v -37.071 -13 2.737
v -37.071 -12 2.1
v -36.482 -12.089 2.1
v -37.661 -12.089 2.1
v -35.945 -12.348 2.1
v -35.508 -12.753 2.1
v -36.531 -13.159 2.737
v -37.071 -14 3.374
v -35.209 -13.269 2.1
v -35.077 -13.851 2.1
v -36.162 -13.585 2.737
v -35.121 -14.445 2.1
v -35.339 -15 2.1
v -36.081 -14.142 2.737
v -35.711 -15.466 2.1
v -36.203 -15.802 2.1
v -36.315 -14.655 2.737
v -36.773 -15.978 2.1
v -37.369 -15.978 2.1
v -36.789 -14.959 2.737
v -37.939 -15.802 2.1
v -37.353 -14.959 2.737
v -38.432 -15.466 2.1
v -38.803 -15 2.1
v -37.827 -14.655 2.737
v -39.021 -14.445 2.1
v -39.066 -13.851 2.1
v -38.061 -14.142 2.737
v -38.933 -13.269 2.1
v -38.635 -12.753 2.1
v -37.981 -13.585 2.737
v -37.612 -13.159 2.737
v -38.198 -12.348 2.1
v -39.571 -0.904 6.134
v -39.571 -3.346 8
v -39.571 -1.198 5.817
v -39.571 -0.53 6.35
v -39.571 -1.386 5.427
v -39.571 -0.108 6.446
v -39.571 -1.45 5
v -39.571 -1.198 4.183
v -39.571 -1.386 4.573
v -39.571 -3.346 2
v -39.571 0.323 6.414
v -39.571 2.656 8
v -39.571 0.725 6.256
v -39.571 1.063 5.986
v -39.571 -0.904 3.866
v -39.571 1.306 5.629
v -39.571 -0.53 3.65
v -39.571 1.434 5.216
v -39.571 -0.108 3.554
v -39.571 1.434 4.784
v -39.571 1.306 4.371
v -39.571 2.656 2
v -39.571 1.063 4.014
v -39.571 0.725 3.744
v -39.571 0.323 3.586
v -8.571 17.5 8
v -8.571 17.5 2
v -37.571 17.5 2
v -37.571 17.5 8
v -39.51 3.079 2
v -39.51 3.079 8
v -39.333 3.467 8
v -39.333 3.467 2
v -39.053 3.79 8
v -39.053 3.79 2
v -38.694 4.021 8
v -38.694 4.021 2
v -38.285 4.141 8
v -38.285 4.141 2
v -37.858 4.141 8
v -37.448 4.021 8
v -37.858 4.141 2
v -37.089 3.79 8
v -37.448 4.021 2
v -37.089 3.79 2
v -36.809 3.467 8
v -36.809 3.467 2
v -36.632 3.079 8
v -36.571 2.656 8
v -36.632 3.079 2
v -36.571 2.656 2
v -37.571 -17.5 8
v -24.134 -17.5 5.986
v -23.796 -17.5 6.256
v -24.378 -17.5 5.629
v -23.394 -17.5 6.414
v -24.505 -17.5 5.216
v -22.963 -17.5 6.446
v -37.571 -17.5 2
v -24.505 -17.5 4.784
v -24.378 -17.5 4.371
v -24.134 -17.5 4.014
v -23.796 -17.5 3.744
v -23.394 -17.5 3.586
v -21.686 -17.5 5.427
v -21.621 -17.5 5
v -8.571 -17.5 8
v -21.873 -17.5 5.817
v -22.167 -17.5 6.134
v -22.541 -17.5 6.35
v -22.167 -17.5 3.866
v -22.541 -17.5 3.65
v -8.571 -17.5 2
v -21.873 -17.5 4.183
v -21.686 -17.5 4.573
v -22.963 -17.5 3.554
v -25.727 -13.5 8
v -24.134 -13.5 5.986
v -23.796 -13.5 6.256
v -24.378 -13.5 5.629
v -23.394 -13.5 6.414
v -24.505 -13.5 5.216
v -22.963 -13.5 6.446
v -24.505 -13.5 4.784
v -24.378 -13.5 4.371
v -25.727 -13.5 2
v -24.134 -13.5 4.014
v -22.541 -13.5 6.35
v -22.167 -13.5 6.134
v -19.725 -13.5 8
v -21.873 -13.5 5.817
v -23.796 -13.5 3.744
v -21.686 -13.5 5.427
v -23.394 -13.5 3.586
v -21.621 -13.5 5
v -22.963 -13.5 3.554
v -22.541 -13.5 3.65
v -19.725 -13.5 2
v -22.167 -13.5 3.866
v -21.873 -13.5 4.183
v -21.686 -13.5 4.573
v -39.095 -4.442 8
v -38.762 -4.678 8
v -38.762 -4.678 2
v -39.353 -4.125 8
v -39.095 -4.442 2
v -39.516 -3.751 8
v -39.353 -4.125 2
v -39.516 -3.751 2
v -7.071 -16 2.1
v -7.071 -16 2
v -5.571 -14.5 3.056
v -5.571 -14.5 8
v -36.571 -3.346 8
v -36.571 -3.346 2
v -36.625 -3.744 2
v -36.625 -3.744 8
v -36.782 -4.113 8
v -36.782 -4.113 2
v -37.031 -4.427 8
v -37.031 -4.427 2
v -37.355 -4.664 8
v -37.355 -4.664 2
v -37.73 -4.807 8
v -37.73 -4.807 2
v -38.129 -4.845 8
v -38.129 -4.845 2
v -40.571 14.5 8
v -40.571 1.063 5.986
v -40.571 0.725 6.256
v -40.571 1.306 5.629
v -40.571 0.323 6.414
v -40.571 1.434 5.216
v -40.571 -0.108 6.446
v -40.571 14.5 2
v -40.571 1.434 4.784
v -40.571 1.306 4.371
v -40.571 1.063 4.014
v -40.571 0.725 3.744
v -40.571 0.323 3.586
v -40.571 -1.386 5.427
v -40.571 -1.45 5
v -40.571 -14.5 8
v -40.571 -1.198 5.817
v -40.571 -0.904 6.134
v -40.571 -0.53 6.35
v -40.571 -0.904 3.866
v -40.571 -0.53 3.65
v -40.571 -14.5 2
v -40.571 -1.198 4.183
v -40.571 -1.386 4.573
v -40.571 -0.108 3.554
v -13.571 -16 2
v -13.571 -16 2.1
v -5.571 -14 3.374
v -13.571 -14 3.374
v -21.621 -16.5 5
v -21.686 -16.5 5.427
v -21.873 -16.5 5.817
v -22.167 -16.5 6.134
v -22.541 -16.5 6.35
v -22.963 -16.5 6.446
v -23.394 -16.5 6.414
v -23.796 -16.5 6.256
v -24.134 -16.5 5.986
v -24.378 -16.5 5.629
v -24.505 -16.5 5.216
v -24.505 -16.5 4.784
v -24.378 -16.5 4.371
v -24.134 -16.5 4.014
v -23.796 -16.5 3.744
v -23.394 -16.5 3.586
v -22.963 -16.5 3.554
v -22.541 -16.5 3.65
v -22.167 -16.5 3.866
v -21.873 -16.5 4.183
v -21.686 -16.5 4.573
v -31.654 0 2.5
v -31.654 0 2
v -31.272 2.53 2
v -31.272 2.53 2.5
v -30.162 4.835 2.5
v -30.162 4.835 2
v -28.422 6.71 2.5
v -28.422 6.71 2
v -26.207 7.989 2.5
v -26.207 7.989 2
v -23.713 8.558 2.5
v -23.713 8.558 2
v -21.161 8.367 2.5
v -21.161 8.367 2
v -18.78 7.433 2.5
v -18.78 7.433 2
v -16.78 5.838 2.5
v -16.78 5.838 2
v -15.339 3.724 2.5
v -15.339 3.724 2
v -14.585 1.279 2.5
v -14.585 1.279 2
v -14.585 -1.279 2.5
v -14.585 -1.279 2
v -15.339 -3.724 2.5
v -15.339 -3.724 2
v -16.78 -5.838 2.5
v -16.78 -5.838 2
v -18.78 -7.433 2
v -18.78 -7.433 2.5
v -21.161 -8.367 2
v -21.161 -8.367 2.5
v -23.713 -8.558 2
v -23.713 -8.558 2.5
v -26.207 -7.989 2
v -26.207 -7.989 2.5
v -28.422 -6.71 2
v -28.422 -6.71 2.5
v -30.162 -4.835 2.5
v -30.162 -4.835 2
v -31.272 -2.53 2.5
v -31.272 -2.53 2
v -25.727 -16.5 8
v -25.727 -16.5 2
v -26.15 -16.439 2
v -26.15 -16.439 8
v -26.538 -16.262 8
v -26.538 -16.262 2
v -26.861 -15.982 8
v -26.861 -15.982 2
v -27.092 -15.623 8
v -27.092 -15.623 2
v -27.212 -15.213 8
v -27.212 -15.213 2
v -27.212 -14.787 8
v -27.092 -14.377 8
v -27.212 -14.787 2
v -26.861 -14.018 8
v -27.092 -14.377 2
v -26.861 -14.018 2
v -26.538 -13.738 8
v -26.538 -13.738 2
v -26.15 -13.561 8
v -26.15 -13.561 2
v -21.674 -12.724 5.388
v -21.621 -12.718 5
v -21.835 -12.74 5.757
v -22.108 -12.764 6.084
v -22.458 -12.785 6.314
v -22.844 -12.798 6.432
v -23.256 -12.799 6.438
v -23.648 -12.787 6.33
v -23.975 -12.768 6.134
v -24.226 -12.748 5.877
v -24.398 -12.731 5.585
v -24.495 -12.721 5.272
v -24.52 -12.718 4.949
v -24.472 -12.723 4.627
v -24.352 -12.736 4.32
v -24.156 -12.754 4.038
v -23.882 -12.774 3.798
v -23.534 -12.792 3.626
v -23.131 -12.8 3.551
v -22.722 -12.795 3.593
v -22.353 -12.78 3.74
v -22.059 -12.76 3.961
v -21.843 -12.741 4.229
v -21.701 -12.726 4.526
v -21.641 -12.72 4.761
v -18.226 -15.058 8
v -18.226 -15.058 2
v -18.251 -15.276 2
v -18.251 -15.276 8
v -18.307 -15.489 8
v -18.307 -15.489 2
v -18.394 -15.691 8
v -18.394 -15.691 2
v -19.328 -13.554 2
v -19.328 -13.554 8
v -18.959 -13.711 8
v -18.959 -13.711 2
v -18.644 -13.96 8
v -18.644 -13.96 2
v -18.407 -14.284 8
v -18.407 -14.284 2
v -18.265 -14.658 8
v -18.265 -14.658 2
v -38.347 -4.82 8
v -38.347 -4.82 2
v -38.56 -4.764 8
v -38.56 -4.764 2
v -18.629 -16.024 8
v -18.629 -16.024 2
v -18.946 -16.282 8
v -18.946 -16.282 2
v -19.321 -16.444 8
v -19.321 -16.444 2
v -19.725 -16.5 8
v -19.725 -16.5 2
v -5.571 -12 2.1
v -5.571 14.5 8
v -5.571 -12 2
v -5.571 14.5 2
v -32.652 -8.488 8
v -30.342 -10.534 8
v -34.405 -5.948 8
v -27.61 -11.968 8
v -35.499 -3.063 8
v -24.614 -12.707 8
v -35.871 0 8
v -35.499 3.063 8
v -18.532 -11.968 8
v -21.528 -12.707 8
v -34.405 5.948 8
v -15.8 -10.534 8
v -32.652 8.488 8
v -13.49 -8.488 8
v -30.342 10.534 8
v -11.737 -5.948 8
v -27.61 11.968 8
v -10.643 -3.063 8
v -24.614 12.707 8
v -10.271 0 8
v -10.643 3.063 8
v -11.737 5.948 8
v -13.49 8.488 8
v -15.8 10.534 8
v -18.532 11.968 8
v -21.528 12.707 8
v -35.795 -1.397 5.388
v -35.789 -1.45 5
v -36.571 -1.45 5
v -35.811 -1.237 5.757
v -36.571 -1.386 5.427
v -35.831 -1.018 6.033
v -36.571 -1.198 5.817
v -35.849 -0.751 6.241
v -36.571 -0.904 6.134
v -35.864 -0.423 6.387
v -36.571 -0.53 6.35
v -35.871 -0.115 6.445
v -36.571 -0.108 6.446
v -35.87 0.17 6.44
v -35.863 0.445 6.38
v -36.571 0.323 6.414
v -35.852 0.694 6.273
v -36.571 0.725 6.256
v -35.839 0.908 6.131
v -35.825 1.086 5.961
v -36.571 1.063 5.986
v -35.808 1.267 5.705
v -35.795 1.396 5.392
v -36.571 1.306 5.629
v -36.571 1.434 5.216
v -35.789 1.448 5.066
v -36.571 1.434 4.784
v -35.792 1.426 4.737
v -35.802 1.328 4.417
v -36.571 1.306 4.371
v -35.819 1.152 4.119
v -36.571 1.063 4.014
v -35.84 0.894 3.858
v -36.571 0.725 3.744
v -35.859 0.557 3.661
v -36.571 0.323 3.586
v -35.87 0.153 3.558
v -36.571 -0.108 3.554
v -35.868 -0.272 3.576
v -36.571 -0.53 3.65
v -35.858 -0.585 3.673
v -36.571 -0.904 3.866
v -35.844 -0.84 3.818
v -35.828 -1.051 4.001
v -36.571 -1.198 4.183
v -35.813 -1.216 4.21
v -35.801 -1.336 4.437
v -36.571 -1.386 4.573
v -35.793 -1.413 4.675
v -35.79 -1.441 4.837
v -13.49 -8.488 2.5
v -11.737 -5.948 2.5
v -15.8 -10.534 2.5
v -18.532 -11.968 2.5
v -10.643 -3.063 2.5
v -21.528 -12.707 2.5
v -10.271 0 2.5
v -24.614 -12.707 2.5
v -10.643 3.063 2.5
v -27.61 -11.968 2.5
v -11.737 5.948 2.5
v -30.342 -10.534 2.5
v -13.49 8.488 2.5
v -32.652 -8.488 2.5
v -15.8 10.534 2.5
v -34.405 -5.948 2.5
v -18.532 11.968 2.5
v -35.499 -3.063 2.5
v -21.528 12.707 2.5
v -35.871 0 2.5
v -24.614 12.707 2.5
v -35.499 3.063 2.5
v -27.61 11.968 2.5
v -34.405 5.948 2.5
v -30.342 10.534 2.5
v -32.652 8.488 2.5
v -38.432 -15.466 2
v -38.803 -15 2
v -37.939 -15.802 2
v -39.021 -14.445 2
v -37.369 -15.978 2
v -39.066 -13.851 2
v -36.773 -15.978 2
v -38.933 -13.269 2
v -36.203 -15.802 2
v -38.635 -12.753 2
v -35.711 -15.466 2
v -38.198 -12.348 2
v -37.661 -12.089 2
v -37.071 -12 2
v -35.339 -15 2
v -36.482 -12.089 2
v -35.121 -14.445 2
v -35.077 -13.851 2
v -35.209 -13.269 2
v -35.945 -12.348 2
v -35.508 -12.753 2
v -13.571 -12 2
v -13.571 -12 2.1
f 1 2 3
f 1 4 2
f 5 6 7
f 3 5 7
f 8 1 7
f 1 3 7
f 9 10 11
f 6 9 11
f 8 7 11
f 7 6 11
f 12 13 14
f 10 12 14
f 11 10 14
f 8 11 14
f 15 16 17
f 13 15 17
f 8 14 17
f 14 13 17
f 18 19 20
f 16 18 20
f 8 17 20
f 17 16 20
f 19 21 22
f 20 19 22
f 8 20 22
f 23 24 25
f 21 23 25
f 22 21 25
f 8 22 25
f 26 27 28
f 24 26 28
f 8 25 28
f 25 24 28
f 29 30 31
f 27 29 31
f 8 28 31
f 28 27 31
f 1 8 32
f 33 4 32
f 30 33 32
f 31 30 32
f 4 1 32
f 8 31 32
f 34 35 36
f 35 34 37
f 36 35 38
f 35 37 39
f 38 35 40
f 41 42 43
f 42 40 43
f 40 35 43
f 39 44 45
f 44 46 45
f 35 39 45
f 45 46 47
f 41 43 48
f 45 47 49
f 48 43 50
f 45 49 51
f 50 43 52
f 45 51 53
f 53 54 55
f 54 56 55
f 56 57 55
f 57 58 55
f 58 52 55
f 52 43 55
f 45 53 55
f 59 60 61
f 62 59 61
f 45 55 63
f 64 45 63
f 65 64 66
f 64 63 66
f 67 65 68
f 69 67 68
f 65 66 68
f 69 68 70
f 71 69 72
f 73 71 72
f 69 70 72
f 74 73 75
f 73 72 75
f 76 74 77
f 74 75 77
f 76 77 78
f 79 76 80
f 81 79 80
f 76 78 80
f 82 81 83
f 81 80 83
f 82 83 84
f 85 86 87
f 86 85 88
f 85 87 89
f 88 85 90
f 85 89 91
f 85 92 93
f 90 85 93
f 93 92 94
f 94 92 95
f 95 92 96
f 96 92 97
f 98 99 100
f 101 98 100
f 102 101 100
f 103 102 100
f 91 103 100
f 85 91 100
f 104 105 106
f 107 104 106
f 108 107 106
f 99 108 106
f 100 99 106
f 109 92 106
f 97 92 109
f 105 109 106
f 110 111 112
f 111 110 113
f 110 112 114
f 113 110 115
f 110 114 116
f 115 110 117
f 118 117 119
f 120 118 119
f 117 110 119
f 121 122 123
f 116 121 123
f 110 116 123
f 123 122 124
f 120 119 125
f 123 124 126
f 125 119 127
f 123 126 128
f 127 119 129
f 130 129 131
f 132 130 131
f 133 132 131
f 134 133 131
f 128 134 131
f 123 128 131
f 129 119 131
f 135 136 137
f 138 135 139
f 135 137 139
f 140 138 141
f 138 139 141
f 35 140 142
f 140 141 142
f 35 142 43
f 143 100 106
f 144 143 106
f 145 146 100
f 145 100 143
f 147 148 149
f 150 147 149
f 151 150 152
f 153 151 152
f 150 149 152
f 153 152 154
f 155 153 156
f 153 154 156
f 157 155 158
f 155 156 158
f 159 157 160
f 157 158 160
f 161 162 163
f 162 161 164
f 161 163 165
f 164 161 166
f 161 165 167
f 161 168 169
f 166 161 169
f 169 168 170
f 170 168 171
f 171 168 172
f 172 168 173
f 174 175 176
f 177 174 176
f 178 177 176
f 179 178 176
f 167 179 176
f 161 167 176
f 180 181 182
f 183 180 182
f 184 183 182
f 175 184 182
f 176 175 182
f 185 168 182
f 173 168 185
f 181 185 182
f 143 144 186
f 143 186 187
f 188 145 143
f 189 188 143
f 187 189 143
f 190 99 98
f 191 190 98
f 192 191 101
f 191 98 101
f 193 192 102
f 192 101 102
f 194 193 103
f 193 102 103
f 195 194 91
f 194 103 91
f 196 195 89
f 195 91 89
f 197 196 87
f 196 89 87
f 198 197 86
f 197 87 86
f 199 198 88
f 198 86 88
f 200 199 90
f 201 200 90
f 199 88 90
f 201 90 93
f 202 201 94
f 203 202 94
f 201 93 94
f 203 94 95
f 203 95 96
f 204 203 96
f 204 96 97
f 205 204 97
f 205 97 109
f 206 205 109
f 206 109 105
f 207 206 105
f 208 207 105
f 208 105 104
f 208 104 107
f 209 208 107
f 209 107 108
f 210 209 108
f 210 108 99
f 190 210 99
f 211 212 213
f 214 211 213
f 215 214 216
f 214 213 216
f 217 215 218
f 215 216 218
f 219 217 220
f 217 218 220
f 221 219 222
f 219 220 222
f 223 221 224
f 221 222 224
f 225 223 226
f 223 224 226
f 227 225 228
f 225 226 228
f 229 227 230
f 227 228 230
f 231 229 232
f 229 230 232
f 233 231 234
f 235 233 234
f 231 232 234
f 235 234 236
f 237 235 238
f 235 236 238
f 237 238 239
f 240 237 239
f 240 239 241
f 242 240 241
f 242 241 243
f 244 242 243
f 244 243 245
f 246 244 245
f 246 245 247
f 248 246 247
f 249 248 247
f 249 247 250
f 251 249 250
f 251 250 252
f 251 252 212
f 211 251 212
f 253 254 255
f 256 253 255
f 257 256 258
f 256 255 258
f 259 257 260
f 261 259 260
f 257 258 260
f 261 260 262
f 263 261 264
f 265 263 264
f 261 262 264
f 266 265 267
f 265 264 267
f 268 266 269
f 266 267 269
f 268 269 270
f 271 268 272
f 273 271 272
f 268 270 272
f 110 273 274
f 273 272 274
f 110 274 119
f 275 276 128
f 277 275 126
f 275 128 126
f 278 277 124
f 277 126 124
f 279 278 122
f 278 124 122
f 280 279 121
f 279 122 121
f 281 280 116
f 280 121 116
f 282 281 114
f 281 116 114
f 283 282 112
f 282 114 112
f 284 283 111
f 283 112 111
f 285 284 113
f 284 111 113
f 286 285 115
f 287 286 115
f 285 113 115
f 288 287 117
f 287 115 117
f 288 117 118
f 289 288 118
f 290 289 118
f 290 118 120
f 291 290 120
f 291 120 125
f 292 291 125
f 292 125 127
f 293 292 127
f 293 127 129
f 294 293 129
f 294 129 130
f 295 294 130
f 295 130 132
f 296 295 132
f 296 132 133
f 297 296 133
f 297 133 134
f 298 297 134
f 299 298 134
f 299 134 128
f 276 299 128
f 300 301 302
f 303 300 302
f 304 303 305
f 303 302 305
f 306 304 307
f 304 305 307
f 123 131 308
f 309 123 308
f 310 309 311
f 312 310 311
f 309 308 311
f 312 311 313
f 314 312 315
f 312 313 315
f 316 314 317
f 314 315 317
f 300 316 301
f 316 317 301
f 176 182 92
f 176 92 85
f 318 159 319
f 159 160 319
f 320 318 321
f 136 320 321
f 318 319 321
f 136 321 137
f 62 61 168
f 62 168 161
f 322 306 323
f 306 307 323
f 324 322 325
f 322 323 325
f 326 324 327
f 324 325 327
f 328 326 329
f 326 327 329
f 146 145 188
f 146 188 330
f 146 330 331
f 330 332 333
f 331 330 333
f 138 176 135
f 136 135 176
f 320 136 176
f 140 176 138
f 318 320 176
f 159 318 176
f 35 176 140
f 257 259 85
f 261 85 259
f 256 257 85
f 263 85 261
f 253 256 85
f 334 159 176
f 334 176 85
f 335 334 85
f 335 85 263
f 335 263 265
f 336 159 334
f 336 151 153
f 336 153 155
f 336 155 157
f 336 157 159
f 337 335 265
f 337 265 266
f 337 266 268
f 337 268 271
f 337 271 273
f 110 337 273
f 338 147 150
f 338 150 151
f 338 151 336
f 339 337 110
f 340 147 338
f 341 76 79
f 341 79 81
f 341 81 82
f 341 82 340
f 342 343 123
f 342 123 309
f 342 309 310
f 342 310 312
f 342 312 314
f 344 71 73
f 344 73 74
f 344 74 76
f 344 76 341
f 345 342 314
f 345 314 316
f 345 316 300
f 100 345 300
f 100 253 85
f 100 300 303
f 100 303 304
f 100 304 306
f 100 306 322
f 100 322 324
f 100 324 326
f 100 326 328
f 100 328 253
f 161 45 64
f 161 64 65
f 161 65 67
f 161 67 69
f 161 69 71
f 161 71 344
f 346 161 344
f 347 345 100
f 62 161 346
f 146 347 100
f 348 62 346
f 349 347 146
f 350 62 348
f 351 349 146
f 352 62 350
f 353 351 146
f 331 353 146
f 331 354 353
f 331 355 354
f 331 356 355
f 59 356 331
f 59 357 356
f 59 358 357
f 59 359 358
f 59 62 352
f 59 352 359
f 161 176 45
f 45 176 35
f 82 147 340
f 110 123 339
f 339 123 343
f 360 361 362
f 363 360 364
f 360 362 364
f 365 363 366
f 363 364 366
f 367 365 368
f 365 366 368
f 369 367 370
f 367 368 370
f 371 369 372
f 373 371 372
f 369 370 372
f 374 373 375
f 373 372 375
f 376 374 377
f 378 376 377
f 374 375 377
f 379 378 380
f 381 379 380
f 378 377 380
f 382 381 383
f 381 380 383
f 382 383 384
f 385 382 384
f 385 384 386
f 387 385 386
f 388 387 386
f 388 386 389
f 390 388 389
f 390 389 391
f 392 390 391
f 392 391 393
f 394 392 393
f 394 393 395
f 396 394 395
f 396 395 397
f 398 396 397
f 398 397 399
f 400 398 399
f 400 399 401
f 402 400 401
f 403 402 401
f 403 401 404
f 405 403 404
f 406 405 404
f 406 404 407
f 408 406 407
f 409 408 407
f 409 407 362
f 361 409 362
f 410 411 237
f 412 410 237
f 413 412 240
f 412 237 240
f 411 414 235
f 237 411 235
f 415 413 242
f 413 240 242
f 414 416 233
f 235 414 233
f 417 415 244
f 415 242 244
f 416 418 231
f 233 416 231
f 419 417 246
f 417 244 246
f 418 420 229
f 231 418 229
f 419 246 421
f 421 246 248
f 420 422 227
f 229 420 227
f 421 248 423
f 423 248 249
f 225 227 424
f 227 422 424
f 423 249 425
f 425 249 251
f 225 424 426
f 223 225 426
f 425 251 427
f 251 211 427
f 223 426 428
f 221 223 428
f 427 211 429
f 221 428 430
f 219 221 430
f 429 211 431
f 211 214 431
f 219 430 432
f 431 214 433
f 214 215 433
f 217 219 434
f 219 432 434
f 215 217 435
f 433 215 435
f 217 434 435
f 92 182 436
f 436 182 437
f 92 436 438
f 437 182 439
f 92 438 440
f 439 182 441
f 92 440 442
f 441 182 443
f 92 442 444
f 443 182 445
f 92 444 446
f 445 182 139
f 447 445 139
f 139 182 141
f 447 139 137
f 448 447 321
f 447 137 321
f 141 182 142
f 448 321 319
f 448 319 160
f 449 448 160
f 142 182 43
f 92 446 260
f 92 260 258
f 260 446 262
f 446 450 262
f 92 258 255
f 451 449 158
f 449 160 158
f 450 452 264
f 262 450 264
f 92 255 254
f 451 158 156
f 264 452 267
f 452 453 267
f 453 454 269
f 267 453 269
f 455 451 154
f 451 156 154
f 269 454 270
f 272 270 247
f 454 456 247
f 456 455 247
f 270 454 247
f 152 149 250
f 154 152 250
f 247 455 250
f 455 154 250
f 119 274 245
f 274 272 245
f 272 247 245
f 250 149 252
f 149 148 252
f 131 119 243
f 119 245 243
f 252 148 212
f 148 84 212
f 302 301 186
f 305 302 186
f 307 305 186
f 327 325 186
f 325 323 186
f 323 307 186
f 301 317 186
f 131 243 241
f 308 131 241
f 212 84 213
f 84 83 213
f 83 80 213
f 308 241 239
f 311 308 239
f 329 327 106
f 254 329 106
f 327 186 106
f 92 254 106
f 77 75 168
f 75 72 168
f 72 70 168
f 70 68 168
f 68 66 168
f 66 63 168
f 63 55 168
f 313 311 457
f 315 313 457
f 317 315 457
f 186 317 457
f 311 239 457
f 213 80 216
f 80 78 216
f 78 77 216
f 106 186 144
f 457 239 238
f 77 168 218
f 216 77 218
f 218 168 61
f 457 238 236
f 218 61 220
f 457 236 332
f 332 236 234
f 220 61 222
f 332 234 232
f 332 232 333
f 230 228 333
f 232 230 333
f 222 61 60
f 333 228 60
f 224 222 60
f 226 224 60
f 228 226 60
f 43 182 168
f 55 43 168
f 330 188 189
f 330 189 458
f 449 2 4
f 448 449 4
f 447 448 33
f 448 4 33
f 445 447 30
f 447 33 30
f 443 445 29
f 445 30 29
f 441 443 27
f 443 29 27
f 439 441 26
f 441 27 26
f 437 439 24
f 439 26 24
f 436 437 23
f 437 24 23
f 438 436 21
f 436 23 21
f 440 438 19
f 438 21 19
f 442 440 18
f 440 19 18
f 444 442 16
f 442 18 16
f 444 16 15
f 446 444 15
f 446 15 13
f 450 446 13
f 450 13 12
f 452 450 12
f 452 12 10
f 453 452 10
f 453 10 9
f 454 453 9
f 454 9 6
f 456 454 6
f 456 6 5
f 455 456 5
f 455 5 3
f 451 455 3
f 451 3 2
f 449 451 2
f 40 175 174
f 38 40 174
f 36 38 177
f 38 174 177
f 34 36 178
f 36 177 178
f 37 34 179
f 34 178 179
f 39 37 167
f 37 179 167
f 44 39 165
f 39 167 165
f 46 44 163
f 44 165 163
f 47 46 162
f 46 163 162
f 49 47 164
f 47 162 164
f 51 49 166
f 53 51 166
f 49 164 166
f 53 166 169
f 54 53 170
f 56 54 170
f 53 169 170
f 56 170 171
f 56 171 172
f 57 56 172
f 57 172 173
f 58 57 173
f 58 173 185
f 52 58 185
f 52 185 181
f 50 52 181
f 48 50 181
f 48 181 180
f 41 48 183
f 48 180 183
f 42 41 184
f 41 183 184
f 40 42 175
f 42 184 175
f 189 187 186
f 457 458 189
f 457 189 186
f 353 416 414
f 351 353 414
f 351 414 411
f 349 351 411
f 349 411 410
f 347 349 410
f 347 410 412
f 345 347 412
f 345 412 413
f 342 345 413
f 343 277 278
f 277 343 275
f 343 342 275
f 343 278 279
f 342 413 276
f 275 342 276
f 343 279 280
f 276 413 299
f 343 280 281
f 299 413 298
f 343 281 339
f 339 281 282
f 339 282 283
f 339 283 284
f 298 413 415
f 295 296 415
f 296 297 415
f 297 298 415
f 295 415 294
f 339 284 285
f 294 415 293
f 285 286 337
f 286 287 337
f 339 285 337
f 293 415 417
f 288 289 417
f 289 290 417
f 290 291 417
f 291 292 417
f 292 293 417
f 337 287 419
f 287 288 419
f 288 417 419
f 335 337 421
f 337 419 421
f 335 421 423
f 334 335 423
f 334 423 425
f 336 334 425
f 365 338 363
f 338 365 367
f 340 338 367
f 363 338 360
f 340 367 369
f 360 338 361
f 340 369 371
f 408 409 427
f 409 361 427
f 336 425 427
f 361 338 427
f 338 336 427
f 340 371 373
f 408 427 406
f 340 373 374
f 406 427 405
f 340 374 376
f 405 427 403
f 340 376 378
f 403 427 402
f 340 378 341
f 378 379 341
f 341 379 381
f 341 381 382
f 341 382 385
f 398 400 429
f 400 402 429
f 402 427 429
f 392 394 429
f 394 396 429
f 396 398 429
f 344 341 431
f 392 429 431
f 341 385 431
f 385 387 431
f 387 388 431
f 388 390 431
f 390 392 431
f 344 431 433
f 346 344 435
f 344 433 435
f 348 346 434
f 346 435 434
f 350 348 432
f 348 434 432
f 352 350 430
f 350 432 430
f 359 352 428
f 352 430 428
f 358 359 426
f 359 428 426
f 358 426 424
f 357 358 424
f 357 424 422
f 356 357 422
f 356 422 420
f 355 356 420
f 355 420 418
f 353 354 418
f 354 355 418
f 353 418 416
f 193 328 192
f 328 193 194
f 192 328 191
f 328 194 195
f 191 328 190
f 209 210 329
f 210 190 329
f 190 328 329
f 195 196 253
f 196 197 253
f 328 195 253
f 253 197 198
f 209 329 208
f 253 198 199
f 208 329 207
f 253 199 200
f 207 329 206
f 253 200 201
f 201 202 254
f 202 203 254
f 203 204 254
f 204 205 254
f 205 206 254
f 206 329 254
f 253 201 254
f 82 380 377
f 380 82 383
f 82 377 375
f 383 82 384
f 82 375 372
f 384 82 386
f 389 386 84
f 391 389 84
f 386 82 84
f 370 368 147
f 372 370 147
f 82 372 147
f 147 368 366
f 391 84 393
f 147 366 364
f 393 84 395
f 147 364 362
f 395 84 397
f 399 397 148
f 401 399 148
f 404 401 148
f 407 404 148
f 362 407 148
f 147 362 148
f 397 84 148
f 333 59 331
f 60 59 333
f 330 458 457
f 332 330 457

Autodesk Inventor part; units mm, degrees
ref_plane "YZ Plane" through (0, 0, 0) normal (1, 0, 0) x (0, 1, 0)
ref_plane "XZ Plane" through (0, 0, 0) normal (0, 1, 0) x (-1, 0, 0)
ref_plane "XY Plane" through (0, 0, 0) normal (0, 0, 1) x (1, 0, 0)
ref_plane "Work Plane1" through (0, 0, 2) normal (0, 0, 1) x (1, 0, 0)
sketch "Sketch1" plane through (0, 0, 2) normal (0, 0, 1) x (1, 0, 0)
  circle A0 centre (-37.0712, 14) radius 3.25 construction
  circle A1 centre (-9.0712, -14) radius 3.25 construction
  line L0 (-21.8762, -24.9) -> (-21.8762, -17.08) construction
  line L1 (-21.8762, -17.08) -> (-20.0712, -17.08) construction
  arc A2 (-20.0712, -17.08) -> (-20.0712, -14.08) centre (-20.0712, -15.58) ccw construction
  line L2 (-20.0712, -14.08) -> (-21.8762, -14.08) construction
  line L3 (-21.8762, -14.08) -> (-21.8762, -3.0223) construction
  arc A3 (-21.8762, -3.0223) -> (-25.9925, 1.4242) centre (-23.0712, 0) ccw construction
  line L4 (-25.9925, 1.4242) -> (-37.0712, 1.4242) construction
  line L5 (-37.0712, 1.4242) -> (-37.0712, 3) construction
  arc A4 (-37.0712, 3) -> (-40.0712, 3) centre (-38.5712, 3) ccw construction
  line L6 (-40.0712, 3) -> (-40.0712, 1.4242) construction
  line L7 (-40.0712, 1.4242) -> (-47.9712, 1.4242) construction
  line L8 (-47.9712, 1.4242) -> (-47.9712, 17) construction
  line L9 (-47.9712, 17) -> (-44.3964, 17) construction
  line L10 (-44.3964, 17) -> (-40.0712, 21.3252) construction
  line L11 (-40.0712, 21.3252) -> (-40.0712, 24.9) construction
  line L12 (-40.0712, 24.9) -> (-6.0712, 24.9) construction
  line L13 (-6.0712, 24.9) -> (-6.0712, 21.3252) construction
  line L14 (-6.0712, 21.3252) -> (-1.746, 17) construction
  line L15 (-1.746, 17) -> (1.8288, 17) construction
  line L16 (1.8288, 17) -> (1.8288, -17) construction
  line L17 (1.8288, -17) -> (-1.746, -17) construction
  line L18 (-1.746, -17) -> (-6.1126, -21.3666) construction
  line L19 (-6.1126, -21.3666) -> (-6.1126, -24.9) construction
  line L20 (-6.1126, -24.9) -> (-21.8762, -24.9) construction
  circle A5 centre (-37.0712, -14) radius 3.25 construction
  circle A6 centre (-23.0712, 0) radius 12.45 construction
  circle A7 centre (-23.0712, 0) radius 12.7 construction
  line L21 (-37.0712, 14) -> (-9.0712, 14) construction
  line L22 (-9.0712, 14) -> (-9.0712, -14) construction
  line L23 (-9.0712, -14) -> (-37.0712, -14) construction
  line L24 (-37.0712, -14) -> (-37.0712, 14) construction
  line L25 (-5.5712, -17.5) -> (-5.5712, 17.5)
  line L26 (-5.5712, 17.5) -> (-40.5712, 17.5)
  line L27 (-40.5712, 17.5) -> (-40.5712, -17.5)
  line L28 (-40.5712, -17.5) -> (-5.5712, -17.5)
  circle A8 centre (-23.0712, 0) radius 12.8
  point P0 (0, 0)
  dimension "d0" = 3.5
  dimension "d1" = 0.1
extrude "Extrusion1" add sketch "Sketch1" along normal blind 6
sketch "Sketch2" plane through (0, 0, 2) normal (0, 0, -1) x (-1, 0, 0)
  circle A0 centre (23.0712, 0) radius 12.8 projected
  circle A1 centre (23.0712, 0) radius 8.5824
  line L0 (5.5712, -17.5) -> (5.5712, 17.5) projected
  line L1 (5.5712, 17.5) -> (40.5712, 17.5) projected
  point P0 (0, 0)
  point P1 (5.5712, 0)
  point P2 (23.0712, 17.5)
  point P3 (5.5712, 0)
  point P4 (5.5712, 0)
  point P5 (5.5712, 0)
  point P6 (23.0712, 17.5)
  point P7 (23.0712, 17.5)
  point P8 (23.0712, 17.5)
extrude "Extrusion2" add sketch "Sketch2" against normal blind 0.5
sketch "Sketch3" plane through (0, 0, 2) normal (0, 0, -1) x (-1, 0, 0)
  circle A0 centre (9.0712, -14) radius 1.45 construction
  circle A1 centre (9.0712, -14) radius 2.45
  circle A2 centre (37.0712, -14) radius 1.45 projected
  circle A3 centre (37.0712, -14) radius 1.95
  point P0 (0, 0)
  dimension "d8" = 1
  dimension "d10" = 0.5
sketch "Sketch5" plane through (0, 0, 2) normal (0, 0, -1) x (-1, 0, 0)
  arc A0 (20.0712, -14.08) -> (20.0712, -17.08) centre (20.0712, -15.58) ccw projected
  arc A1 (26.0712, -17.08) -> (26.0712, -14.08) centre (26.0712, -15.58) ccw projected
  line L0 (37.0712, 3) -> (37.0712, -3) projected
  arc A2 (37.0712, -3) -> (40.0712, -3) centre (38.5712, -3) ccw projected
  line L1 (40.0712, -3) -> (40.0712, 3) projected
  arc A3 (40.0712, 3) -> (37.0712, 3) centre (38.5712, 3) ccw projected
  line L2 (26.0712, -14.08) -> (20.0712, -14.08) projected
  arc A4 (20.0712, -14.08) -> (20.0712, -17.08) centre (20.0712, -15.58) ccw projected
  line L3 (20.0712, -17.08) -> (26.0712, -17.08) projected
  arc A5 (26.0712, -17.08) -> (26.0712, -14.08) centre (26.0712, -15.58) ccw projected
  circle A6 centre (37.0712, -14) radius 1.45 projected
  circle A7 centre (23.0712, 0) radius 1.45 projected
  circle A8 centre (9.0712, -14) radius 1.45 projected
  circle A9 centre (37.0712, 14) radius 1.45 projected
  line L4 (-1.8288, -17) -> (-1.8288, 17) projected
  line L5 (-1.8288, 17) -> (1.746, 17) projected
  line L6 (1.746, 17) -> (6.0712, 21.3252) projected
  line L7 (6.0712, 21.3252) -> (6.0712, 24.9) projected
  line L8 (6.0712, 24.9) -> (40.0712, 24.9) projected
  line L9 (40.0712, 24.9) -> (40.0712, 21.3252) projected
  line L10 (40.0712, 21.3252) -> (44.3964, 17) projected
  line L11 (44.3964, 17) -> (47.9712, 17) projected
  line L12 (47.9712, 17) -> (47.9712, -17) projected
  line L13 (44.3964, -17) -> (47.9712, -17) projected
  line L14 (40.0712, -21.3252) -> (44.3964, -17) projected
  line L15 (40.0712, -24.9) -> (40.0712, -21.3252) projected
  line L16 (6.1126, -24.9) -> (40.0712, -24.9) projected
  line L17 (6.1126, -24.9) -> (6.1126, -21.3666) projected
  line L18 (6.1126, -21.3666) -> (1.746, -17) projected
  line L19 (1.746, -17) -> (-1.8288, -17) projected
  line L20 (40.5712, -17.5) -> (5.5712, -17.5) projected
  arc A10 (19.7251, -13.5) -> (18.2262, -15.0577) centre (19.7251, -15) ccw
  arc A11 (25.7274, -16.5) -> (25.7274, -16.5) centre (25.7274, -15) ccw
  line L21 (25.7274, -13.5) -> (25.7274, -13.5)
  arc A12 (19.7251, -13.5) -> (18.2262, -15.0577) centre (19.7251, -15) ccw
  line L22 (19.7251, -16.5) -> (19.7251, -16.5)
  arc A13 (25.7274, -16.5) -> (25.7274, -16.5) centre (25.7274, -15) ccw
  arc A14 (18.3936, -15.6908) -> (19.7251, -16.5) centre (19.7251, -15) ccw
  arc A15 (18.2262, -15.0577) -> (18.3936, -15.6908) centre (19.7251, -15) ccw
  arc A16 (18.3936, -15.6908) -> (19.7251, -16.5) centre (19.7251, -15) ccw
  arc A17 (18.2262, -15.0577) -> (18.3936, -15.6908) centre (19.7251, -15) ccw
  arc A18 (26.9396, -15.8835) -> (27.2262, -15.0582) centre (25.7274, -15) ccw
  arc A19 (26.9396, -15.8835) -> (27.2262, -15.0582) centre (25.7274, -15) ccw
  arc A20 (27.2262, -15.0582) -> (25.7274, -13.5) centre (25.7274, -15) ccw
  arc A21 (27.2262, -15.0582) -> (25.7274, -13.5) centre (25.7274, -15) ccw
  line L23 (19.7251, -16.5) -> (25.7274, -16.5)
  line L24 (25.7274, -13.5) -> (19.7251, -13.5)
  line L25 (19.7251, -13.5) -> (19.7251, -13.5)
  arc A22 (25.7274, -16.5) -> (26.9396, -15.8835) centre (25.7274, -15) ccw
  arc A23 (25.7274, -16.5) -> (26.9396, -15.8835) centre (25.7274, -15) ccw
  point P0 (0, 0)
  point P1 (40.0712, -3)
  point P2 (22.6287, -9.823)
  point P3 (22.6523, -12.823)
  point P4 (19.7251, -16.5)
  point P5 (25.7274, -16.5)
  point P6 (25.7274, -13.5)
  point P7 (19.7251, -13.5)
  dimension "d50" = 9
  dimension "d52" = 3
  dimension "d53" = 1.5
  dimension "d56" = 1.5
  dimension "d57" = 1.5
  dimension "d58" = 1.5
  dimension "d59" = 1
extrude "Extrusion5" cut sketch "Sketch5" against normal blind 8 contours L2 A11 L23 A14 A0 | A0 A14 A15 A10 L24 A11 L2 | A11 A1 L2 | L2 A1 A11
sketch "Sketch6" plane through (-40.5712, -17.5, 8) normal (0, -1, 0) x (1, 0, 0)
  line L0 (0, -6) -> (35, -6) projected
  line L1 (35, -6) -> (35, 0) projected
  line L2 (0, 0) -> (35, 0) projected
  line L3 (0, -6) -> (0, 0) projected
  line L4 (30.3, 0) -> (30.3, 0) projected
  circle A0 centre (17.5, -3) radius 1.45
  point P0 (40.5712, -8)
  point P1 (17.5, 0)
  point P2 (35, -3)
  dimension "d34" = 2.9
extrude "Extrusion6" cut sketch "Sketch6" against normal blind 8 contours A0
pattern_circular "Circular Pattern1" count 2 over 90 about axis through (-23.0712, 0, 2) along (0, 0, -1) of "Extrusion6"
chamfer "Chamfer1" distance 3 angle 45 4 edges at (-40.5712, 17.5, 5) (-5.5712, 17.5, 5) (-5.5712, -17.5, 5) (-40.5712, -17.5, 5)
hole "Hole1" at (-37.0712, -14, 2) direction (0, 0, 1) diameter 4 depth 0.1 tip angle 115
sketch "Sketch4" plane through (-5.5712, -17.5, 2) normal (1, 0, 0) x (0, 0, -1)
  line L0 (2, 4.45) -> (6, 4.45)
  line L1 (2, 1.55) -> (6, 1.55)
  line L2 (0, 0) -> (0, 35) projected
  arc A0 (2, 19) -> (2, 19) centre (1.5, 4.4206) ccw projected
  line L3 (-1.3741, 3.5) -> (-0.1, 5.5) projected
  line L4 (-1.3741, 3.5) -> (-0.1, 1.5) projected
  line L5 (-0.1, 5.5) -> (0.6045, 5.5)
  line L6 (0.6045, 5.5) -> (0.6045, 1.5)
  line L7 (0.6045, 1.5) -> (-0.1, 1.5)
  line L8 (-0.1, 1.5) -> (-0.1, 5.5)
  point P0 (2, 17.5)
  point P1 (-0.1, 1.5)
extrude "Extrusion4" cut sketch "Sketch4" against normal blind 8 contours L7 L8 L5 L2 | L2 L5 L6 L7 | L4 L3 L8
pattern_circular "Circular Pattern2" count 2 over 90 about axis through (-23.0712, 0, 2) along (0, 0, -1) of "Extrusion5"
equation "\"d50\" = d49"
equation "\"d52\" = d51"
equation "\"d53\" = d55"
equation "\"d56\" = d55"
equation "\"d49\" = 9"
equation "\"d51\" = 3"
equation "\"d55\" = 1.5"
properties part number "20_Cube_Insert_Kinematic_KES400AMount_45_UPD_v3"
